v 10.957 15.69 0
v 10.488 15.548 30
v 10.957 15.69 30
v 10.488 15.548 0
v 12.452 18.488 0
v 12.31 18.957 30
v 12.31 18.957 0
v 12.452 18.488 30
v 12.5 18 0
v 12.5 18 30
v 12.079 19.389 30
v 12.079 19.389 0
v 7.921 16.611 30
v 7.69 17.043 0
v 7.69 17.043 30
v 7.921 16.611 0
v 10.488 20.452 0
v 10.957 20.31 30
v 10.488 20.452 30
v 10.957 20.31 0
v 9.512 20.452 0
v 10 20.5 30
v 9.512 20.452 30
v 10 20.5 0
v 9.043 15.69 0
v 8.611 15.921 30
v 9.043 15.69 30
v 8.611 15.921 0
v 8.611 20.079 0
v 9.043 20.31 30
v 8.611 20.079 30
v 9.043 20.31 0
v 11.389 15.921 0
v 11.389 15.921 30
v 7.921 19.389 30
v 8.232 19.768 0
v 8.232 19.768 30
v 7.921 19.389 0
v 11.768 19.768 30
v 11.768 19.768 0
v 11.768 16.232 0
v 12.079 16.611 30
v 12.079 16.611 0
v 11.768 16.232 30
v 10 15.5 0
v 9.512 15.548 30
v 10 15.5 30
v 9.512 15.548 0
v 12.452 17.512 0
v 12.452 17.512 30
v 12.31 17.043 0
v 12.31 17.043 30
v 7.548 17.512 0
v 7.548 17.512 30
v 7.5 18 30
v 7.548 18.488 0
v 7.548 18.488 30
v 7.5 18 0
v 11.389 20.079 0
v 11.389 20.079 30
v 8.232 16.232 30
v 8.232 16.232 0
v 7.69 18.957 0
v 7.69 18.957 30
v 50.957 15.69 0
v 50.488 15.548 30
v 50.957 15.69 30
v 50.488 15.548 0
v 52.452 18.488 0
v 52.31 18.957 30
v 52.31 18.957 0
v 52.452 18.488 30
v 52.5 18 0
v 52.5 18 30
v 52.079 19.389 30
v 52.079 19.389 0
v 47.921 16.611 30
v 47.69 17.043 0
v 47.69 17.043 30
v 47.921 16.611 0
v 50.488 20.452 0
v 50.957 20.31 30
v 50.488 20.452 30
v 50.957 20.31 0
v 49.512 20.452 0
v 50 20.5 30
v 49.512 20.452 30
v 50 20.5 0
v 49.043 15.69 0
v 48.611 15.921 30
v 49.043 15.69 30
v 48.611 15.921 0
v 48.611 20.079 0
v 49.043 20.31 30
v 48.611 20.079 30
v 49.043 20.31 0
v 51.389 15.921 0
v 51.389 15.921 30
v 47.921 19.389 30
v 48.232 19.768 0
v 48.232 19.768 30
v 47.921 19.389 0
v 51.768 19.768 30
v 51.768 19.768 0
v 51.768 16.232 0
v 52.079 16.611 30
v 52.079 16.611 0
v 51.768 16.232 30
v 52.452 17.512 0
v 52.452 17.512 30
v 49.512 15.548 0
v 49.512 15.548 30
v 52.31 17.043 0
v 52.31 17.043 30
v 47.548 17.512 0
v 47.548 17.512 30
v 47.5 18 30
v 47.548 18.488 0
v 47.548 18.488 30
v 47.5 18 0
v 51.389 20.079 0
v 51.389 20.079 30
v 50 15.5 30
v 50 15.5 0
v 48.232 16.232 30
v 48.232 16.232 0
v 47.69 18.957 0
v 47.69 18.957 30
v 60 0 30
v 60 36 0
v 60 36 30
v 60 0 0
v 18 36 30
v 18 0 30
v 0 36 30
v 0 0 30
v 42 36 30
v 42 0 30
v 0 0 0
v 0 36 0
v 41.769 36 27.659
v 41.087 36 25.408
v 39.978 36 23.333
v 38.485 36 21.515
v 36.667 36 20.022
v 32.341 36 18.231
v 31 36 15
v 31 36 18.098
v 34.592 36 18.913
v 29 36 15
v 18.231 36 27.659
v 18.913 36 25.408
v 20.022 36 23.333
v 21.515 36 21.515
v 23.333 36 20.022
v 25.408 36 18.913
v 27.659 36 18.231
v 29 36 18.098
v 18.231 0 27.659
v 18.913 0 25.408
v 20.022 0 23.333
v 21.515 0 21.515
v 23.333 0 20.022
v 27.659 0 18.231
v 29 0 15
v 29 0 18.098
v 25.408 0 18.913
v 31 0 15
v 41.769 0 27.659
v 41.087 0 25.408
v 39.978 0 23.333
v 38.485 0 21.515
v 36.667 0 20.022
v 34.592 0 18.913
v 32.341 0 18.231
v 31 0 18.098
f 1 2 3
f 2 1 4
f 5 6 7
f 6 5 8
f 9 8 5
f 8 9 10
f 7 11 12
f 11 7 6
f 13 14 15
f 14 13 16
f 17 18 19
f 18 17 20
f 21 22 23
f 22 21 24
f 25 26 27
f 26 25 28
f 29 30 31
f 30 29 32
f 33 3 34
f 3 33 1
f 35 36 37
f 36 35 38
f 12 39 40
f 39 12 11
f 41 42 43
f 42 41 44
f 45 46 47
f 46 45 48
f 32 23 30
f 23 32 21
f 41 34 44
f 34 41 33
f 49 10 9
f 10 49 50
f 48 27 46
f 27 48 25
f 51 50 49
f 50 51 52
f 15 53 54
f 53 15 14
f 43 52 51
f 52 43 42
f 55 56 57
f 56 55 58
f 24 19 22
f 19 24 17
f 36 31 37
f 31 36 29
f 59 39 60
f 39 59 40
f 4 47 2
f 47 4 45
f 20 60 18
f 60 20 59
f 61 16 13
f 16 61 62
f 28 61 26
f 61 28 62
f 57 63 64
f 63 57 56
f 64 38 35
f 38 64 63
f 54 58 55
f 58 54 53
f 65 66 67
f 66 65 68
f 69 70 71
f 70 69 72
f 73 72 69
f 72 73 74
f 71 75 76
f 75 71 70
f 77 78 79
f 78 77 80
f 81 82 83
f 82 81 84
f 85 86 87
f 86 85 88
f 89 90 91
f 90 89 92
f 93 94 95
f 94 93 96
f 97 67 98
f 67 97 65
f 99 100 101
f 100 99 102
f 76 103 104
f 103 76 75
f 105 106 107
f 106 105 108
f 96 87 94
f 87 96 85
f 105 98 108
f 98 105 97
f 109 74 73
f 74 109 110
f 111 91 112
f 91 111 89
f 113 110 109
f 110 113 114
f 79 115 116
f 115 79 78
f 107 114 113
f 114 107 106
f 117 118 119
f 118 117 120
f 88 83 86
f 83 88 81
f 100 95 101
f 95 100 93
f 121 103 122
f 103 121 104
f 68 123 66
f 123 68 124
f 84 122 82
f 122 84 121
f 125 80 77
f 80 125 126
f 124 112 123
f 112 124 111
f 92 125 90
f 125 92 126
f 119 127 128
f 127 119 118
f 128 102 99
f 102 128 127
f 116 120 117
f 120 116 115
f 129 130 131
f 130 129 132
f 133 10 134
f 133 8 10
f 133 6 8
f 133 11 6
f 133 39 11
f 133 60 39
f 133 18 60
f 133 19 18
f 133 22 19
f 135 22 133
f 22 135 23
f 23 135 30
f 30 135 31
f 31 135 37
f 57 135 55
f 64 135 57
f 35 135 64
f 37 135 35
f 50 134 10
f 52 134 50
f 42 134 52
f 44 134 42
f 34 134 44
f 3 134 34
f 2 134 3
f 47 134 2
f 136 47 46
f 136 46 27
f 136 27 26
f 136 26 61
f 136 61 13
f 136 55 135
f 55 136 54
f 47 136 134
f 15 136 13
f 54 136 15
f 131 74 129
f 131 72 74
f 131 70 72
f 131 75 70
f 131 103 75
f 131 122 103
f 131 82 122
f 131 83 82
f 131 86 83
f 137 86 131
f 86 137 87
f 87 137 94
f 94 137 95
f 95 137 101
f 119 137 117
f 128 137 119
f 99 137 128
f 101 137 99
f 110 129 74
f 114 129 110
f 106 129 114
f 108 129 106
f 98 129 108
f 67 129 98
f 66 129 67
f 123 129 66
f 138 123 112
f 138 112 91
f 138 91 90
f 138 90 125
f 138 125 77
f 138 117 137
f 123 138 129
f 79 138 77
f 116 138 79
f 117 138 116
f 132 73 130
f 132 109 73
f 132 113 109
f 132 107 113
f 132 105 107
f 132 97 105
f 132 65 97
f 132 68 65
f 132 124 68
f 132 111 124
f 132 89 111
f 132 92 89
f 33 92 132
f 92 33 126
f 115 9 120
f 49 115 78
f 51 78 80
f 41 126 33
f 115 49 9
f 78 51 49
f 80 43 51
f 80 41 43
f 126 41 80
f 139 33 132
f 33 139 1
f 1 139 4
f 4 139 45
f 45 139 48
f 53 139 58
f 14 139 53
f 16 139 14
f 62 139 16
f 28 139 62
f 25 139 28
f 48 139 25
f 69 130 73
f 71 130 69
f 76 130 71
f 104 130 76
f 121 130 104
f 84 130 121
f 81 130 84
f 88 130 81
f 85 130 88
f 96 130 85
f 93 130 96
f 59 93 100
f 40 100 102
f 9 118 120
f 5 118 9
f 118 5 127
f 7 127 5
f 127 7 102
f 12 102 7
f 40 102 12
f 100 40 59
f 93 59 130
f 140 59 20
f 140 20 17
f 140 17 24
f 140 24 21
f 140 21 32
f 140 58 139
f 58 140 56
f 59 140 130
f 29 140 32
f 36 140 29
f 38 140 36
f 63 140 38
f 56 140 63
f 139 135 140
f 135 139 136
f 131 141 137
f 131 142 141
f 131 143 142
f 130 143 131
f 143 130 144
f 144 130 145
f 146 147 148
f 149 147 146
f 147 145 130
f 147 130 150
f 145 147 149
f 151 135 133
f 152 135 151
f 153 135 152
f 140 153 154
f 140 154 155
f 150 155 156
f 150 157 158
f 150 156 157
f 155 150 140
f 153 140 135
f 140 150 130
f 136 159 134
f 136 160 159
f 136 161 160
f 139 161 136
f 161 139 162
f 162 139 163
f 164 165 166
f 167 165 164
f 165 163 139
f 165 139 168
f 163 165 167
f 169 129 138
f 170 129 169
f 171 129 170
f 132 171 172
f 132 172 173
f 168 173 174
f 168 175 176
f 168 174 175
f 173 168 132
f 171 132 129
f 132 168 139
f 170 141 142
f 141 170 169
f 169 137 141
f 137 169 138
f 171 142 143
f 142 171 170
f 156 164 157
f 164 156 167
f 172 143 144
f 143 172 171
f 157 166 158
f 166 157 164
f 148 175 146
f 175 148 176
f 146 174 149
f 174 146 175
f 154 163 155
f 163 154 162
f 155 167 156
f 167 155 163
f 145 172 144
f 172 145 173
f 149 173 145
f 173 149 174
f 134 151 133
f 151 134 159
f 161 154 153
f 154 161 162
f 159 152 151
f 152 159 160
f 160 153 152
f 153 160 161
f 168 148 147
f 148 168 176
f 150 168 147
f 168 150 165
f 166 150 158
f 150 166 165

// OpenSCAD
$fn = 32;

// ----------------------------------------------------------------------
// Saddle clamp: split shaft clamp
// ----------------------------------------------------------------------

// --- parameters (mm) ---
blk_l = 60;               // block length, X
blk_w = 36;               // block width, Y
blk_h = 30;               // block height
clamp_r = 12;             // shaft groove radius
hole_r = 2.5;             // bolt hole radius
hole_m = 10;              // bolt hole margin from the ends
saw_w = 2;                // saw kerf width

saw_depth = clamp_r + 3;  // saw kerf depth

difference() {
  cube([blk_l, blk_w, blk_h]);
  translate([blk_l / 2, -1, blk_h])
    rotate([-90, 0, 0])
      cylinder(h = blk_w + 2, r = clamp_r);
  for (sx = [0, 1])
    translate([sx ? blk_l - hole_m : hole_m, blk_w / 2, -1])
      cylinder(r = hole_r, h = blk_h + 2);
  translate([blk_l / 2 - saw_w / 2, -1, blk_h - saw_depth])
    cube([saw_w, blk_w + 2, saw_depth + 1]);
}
